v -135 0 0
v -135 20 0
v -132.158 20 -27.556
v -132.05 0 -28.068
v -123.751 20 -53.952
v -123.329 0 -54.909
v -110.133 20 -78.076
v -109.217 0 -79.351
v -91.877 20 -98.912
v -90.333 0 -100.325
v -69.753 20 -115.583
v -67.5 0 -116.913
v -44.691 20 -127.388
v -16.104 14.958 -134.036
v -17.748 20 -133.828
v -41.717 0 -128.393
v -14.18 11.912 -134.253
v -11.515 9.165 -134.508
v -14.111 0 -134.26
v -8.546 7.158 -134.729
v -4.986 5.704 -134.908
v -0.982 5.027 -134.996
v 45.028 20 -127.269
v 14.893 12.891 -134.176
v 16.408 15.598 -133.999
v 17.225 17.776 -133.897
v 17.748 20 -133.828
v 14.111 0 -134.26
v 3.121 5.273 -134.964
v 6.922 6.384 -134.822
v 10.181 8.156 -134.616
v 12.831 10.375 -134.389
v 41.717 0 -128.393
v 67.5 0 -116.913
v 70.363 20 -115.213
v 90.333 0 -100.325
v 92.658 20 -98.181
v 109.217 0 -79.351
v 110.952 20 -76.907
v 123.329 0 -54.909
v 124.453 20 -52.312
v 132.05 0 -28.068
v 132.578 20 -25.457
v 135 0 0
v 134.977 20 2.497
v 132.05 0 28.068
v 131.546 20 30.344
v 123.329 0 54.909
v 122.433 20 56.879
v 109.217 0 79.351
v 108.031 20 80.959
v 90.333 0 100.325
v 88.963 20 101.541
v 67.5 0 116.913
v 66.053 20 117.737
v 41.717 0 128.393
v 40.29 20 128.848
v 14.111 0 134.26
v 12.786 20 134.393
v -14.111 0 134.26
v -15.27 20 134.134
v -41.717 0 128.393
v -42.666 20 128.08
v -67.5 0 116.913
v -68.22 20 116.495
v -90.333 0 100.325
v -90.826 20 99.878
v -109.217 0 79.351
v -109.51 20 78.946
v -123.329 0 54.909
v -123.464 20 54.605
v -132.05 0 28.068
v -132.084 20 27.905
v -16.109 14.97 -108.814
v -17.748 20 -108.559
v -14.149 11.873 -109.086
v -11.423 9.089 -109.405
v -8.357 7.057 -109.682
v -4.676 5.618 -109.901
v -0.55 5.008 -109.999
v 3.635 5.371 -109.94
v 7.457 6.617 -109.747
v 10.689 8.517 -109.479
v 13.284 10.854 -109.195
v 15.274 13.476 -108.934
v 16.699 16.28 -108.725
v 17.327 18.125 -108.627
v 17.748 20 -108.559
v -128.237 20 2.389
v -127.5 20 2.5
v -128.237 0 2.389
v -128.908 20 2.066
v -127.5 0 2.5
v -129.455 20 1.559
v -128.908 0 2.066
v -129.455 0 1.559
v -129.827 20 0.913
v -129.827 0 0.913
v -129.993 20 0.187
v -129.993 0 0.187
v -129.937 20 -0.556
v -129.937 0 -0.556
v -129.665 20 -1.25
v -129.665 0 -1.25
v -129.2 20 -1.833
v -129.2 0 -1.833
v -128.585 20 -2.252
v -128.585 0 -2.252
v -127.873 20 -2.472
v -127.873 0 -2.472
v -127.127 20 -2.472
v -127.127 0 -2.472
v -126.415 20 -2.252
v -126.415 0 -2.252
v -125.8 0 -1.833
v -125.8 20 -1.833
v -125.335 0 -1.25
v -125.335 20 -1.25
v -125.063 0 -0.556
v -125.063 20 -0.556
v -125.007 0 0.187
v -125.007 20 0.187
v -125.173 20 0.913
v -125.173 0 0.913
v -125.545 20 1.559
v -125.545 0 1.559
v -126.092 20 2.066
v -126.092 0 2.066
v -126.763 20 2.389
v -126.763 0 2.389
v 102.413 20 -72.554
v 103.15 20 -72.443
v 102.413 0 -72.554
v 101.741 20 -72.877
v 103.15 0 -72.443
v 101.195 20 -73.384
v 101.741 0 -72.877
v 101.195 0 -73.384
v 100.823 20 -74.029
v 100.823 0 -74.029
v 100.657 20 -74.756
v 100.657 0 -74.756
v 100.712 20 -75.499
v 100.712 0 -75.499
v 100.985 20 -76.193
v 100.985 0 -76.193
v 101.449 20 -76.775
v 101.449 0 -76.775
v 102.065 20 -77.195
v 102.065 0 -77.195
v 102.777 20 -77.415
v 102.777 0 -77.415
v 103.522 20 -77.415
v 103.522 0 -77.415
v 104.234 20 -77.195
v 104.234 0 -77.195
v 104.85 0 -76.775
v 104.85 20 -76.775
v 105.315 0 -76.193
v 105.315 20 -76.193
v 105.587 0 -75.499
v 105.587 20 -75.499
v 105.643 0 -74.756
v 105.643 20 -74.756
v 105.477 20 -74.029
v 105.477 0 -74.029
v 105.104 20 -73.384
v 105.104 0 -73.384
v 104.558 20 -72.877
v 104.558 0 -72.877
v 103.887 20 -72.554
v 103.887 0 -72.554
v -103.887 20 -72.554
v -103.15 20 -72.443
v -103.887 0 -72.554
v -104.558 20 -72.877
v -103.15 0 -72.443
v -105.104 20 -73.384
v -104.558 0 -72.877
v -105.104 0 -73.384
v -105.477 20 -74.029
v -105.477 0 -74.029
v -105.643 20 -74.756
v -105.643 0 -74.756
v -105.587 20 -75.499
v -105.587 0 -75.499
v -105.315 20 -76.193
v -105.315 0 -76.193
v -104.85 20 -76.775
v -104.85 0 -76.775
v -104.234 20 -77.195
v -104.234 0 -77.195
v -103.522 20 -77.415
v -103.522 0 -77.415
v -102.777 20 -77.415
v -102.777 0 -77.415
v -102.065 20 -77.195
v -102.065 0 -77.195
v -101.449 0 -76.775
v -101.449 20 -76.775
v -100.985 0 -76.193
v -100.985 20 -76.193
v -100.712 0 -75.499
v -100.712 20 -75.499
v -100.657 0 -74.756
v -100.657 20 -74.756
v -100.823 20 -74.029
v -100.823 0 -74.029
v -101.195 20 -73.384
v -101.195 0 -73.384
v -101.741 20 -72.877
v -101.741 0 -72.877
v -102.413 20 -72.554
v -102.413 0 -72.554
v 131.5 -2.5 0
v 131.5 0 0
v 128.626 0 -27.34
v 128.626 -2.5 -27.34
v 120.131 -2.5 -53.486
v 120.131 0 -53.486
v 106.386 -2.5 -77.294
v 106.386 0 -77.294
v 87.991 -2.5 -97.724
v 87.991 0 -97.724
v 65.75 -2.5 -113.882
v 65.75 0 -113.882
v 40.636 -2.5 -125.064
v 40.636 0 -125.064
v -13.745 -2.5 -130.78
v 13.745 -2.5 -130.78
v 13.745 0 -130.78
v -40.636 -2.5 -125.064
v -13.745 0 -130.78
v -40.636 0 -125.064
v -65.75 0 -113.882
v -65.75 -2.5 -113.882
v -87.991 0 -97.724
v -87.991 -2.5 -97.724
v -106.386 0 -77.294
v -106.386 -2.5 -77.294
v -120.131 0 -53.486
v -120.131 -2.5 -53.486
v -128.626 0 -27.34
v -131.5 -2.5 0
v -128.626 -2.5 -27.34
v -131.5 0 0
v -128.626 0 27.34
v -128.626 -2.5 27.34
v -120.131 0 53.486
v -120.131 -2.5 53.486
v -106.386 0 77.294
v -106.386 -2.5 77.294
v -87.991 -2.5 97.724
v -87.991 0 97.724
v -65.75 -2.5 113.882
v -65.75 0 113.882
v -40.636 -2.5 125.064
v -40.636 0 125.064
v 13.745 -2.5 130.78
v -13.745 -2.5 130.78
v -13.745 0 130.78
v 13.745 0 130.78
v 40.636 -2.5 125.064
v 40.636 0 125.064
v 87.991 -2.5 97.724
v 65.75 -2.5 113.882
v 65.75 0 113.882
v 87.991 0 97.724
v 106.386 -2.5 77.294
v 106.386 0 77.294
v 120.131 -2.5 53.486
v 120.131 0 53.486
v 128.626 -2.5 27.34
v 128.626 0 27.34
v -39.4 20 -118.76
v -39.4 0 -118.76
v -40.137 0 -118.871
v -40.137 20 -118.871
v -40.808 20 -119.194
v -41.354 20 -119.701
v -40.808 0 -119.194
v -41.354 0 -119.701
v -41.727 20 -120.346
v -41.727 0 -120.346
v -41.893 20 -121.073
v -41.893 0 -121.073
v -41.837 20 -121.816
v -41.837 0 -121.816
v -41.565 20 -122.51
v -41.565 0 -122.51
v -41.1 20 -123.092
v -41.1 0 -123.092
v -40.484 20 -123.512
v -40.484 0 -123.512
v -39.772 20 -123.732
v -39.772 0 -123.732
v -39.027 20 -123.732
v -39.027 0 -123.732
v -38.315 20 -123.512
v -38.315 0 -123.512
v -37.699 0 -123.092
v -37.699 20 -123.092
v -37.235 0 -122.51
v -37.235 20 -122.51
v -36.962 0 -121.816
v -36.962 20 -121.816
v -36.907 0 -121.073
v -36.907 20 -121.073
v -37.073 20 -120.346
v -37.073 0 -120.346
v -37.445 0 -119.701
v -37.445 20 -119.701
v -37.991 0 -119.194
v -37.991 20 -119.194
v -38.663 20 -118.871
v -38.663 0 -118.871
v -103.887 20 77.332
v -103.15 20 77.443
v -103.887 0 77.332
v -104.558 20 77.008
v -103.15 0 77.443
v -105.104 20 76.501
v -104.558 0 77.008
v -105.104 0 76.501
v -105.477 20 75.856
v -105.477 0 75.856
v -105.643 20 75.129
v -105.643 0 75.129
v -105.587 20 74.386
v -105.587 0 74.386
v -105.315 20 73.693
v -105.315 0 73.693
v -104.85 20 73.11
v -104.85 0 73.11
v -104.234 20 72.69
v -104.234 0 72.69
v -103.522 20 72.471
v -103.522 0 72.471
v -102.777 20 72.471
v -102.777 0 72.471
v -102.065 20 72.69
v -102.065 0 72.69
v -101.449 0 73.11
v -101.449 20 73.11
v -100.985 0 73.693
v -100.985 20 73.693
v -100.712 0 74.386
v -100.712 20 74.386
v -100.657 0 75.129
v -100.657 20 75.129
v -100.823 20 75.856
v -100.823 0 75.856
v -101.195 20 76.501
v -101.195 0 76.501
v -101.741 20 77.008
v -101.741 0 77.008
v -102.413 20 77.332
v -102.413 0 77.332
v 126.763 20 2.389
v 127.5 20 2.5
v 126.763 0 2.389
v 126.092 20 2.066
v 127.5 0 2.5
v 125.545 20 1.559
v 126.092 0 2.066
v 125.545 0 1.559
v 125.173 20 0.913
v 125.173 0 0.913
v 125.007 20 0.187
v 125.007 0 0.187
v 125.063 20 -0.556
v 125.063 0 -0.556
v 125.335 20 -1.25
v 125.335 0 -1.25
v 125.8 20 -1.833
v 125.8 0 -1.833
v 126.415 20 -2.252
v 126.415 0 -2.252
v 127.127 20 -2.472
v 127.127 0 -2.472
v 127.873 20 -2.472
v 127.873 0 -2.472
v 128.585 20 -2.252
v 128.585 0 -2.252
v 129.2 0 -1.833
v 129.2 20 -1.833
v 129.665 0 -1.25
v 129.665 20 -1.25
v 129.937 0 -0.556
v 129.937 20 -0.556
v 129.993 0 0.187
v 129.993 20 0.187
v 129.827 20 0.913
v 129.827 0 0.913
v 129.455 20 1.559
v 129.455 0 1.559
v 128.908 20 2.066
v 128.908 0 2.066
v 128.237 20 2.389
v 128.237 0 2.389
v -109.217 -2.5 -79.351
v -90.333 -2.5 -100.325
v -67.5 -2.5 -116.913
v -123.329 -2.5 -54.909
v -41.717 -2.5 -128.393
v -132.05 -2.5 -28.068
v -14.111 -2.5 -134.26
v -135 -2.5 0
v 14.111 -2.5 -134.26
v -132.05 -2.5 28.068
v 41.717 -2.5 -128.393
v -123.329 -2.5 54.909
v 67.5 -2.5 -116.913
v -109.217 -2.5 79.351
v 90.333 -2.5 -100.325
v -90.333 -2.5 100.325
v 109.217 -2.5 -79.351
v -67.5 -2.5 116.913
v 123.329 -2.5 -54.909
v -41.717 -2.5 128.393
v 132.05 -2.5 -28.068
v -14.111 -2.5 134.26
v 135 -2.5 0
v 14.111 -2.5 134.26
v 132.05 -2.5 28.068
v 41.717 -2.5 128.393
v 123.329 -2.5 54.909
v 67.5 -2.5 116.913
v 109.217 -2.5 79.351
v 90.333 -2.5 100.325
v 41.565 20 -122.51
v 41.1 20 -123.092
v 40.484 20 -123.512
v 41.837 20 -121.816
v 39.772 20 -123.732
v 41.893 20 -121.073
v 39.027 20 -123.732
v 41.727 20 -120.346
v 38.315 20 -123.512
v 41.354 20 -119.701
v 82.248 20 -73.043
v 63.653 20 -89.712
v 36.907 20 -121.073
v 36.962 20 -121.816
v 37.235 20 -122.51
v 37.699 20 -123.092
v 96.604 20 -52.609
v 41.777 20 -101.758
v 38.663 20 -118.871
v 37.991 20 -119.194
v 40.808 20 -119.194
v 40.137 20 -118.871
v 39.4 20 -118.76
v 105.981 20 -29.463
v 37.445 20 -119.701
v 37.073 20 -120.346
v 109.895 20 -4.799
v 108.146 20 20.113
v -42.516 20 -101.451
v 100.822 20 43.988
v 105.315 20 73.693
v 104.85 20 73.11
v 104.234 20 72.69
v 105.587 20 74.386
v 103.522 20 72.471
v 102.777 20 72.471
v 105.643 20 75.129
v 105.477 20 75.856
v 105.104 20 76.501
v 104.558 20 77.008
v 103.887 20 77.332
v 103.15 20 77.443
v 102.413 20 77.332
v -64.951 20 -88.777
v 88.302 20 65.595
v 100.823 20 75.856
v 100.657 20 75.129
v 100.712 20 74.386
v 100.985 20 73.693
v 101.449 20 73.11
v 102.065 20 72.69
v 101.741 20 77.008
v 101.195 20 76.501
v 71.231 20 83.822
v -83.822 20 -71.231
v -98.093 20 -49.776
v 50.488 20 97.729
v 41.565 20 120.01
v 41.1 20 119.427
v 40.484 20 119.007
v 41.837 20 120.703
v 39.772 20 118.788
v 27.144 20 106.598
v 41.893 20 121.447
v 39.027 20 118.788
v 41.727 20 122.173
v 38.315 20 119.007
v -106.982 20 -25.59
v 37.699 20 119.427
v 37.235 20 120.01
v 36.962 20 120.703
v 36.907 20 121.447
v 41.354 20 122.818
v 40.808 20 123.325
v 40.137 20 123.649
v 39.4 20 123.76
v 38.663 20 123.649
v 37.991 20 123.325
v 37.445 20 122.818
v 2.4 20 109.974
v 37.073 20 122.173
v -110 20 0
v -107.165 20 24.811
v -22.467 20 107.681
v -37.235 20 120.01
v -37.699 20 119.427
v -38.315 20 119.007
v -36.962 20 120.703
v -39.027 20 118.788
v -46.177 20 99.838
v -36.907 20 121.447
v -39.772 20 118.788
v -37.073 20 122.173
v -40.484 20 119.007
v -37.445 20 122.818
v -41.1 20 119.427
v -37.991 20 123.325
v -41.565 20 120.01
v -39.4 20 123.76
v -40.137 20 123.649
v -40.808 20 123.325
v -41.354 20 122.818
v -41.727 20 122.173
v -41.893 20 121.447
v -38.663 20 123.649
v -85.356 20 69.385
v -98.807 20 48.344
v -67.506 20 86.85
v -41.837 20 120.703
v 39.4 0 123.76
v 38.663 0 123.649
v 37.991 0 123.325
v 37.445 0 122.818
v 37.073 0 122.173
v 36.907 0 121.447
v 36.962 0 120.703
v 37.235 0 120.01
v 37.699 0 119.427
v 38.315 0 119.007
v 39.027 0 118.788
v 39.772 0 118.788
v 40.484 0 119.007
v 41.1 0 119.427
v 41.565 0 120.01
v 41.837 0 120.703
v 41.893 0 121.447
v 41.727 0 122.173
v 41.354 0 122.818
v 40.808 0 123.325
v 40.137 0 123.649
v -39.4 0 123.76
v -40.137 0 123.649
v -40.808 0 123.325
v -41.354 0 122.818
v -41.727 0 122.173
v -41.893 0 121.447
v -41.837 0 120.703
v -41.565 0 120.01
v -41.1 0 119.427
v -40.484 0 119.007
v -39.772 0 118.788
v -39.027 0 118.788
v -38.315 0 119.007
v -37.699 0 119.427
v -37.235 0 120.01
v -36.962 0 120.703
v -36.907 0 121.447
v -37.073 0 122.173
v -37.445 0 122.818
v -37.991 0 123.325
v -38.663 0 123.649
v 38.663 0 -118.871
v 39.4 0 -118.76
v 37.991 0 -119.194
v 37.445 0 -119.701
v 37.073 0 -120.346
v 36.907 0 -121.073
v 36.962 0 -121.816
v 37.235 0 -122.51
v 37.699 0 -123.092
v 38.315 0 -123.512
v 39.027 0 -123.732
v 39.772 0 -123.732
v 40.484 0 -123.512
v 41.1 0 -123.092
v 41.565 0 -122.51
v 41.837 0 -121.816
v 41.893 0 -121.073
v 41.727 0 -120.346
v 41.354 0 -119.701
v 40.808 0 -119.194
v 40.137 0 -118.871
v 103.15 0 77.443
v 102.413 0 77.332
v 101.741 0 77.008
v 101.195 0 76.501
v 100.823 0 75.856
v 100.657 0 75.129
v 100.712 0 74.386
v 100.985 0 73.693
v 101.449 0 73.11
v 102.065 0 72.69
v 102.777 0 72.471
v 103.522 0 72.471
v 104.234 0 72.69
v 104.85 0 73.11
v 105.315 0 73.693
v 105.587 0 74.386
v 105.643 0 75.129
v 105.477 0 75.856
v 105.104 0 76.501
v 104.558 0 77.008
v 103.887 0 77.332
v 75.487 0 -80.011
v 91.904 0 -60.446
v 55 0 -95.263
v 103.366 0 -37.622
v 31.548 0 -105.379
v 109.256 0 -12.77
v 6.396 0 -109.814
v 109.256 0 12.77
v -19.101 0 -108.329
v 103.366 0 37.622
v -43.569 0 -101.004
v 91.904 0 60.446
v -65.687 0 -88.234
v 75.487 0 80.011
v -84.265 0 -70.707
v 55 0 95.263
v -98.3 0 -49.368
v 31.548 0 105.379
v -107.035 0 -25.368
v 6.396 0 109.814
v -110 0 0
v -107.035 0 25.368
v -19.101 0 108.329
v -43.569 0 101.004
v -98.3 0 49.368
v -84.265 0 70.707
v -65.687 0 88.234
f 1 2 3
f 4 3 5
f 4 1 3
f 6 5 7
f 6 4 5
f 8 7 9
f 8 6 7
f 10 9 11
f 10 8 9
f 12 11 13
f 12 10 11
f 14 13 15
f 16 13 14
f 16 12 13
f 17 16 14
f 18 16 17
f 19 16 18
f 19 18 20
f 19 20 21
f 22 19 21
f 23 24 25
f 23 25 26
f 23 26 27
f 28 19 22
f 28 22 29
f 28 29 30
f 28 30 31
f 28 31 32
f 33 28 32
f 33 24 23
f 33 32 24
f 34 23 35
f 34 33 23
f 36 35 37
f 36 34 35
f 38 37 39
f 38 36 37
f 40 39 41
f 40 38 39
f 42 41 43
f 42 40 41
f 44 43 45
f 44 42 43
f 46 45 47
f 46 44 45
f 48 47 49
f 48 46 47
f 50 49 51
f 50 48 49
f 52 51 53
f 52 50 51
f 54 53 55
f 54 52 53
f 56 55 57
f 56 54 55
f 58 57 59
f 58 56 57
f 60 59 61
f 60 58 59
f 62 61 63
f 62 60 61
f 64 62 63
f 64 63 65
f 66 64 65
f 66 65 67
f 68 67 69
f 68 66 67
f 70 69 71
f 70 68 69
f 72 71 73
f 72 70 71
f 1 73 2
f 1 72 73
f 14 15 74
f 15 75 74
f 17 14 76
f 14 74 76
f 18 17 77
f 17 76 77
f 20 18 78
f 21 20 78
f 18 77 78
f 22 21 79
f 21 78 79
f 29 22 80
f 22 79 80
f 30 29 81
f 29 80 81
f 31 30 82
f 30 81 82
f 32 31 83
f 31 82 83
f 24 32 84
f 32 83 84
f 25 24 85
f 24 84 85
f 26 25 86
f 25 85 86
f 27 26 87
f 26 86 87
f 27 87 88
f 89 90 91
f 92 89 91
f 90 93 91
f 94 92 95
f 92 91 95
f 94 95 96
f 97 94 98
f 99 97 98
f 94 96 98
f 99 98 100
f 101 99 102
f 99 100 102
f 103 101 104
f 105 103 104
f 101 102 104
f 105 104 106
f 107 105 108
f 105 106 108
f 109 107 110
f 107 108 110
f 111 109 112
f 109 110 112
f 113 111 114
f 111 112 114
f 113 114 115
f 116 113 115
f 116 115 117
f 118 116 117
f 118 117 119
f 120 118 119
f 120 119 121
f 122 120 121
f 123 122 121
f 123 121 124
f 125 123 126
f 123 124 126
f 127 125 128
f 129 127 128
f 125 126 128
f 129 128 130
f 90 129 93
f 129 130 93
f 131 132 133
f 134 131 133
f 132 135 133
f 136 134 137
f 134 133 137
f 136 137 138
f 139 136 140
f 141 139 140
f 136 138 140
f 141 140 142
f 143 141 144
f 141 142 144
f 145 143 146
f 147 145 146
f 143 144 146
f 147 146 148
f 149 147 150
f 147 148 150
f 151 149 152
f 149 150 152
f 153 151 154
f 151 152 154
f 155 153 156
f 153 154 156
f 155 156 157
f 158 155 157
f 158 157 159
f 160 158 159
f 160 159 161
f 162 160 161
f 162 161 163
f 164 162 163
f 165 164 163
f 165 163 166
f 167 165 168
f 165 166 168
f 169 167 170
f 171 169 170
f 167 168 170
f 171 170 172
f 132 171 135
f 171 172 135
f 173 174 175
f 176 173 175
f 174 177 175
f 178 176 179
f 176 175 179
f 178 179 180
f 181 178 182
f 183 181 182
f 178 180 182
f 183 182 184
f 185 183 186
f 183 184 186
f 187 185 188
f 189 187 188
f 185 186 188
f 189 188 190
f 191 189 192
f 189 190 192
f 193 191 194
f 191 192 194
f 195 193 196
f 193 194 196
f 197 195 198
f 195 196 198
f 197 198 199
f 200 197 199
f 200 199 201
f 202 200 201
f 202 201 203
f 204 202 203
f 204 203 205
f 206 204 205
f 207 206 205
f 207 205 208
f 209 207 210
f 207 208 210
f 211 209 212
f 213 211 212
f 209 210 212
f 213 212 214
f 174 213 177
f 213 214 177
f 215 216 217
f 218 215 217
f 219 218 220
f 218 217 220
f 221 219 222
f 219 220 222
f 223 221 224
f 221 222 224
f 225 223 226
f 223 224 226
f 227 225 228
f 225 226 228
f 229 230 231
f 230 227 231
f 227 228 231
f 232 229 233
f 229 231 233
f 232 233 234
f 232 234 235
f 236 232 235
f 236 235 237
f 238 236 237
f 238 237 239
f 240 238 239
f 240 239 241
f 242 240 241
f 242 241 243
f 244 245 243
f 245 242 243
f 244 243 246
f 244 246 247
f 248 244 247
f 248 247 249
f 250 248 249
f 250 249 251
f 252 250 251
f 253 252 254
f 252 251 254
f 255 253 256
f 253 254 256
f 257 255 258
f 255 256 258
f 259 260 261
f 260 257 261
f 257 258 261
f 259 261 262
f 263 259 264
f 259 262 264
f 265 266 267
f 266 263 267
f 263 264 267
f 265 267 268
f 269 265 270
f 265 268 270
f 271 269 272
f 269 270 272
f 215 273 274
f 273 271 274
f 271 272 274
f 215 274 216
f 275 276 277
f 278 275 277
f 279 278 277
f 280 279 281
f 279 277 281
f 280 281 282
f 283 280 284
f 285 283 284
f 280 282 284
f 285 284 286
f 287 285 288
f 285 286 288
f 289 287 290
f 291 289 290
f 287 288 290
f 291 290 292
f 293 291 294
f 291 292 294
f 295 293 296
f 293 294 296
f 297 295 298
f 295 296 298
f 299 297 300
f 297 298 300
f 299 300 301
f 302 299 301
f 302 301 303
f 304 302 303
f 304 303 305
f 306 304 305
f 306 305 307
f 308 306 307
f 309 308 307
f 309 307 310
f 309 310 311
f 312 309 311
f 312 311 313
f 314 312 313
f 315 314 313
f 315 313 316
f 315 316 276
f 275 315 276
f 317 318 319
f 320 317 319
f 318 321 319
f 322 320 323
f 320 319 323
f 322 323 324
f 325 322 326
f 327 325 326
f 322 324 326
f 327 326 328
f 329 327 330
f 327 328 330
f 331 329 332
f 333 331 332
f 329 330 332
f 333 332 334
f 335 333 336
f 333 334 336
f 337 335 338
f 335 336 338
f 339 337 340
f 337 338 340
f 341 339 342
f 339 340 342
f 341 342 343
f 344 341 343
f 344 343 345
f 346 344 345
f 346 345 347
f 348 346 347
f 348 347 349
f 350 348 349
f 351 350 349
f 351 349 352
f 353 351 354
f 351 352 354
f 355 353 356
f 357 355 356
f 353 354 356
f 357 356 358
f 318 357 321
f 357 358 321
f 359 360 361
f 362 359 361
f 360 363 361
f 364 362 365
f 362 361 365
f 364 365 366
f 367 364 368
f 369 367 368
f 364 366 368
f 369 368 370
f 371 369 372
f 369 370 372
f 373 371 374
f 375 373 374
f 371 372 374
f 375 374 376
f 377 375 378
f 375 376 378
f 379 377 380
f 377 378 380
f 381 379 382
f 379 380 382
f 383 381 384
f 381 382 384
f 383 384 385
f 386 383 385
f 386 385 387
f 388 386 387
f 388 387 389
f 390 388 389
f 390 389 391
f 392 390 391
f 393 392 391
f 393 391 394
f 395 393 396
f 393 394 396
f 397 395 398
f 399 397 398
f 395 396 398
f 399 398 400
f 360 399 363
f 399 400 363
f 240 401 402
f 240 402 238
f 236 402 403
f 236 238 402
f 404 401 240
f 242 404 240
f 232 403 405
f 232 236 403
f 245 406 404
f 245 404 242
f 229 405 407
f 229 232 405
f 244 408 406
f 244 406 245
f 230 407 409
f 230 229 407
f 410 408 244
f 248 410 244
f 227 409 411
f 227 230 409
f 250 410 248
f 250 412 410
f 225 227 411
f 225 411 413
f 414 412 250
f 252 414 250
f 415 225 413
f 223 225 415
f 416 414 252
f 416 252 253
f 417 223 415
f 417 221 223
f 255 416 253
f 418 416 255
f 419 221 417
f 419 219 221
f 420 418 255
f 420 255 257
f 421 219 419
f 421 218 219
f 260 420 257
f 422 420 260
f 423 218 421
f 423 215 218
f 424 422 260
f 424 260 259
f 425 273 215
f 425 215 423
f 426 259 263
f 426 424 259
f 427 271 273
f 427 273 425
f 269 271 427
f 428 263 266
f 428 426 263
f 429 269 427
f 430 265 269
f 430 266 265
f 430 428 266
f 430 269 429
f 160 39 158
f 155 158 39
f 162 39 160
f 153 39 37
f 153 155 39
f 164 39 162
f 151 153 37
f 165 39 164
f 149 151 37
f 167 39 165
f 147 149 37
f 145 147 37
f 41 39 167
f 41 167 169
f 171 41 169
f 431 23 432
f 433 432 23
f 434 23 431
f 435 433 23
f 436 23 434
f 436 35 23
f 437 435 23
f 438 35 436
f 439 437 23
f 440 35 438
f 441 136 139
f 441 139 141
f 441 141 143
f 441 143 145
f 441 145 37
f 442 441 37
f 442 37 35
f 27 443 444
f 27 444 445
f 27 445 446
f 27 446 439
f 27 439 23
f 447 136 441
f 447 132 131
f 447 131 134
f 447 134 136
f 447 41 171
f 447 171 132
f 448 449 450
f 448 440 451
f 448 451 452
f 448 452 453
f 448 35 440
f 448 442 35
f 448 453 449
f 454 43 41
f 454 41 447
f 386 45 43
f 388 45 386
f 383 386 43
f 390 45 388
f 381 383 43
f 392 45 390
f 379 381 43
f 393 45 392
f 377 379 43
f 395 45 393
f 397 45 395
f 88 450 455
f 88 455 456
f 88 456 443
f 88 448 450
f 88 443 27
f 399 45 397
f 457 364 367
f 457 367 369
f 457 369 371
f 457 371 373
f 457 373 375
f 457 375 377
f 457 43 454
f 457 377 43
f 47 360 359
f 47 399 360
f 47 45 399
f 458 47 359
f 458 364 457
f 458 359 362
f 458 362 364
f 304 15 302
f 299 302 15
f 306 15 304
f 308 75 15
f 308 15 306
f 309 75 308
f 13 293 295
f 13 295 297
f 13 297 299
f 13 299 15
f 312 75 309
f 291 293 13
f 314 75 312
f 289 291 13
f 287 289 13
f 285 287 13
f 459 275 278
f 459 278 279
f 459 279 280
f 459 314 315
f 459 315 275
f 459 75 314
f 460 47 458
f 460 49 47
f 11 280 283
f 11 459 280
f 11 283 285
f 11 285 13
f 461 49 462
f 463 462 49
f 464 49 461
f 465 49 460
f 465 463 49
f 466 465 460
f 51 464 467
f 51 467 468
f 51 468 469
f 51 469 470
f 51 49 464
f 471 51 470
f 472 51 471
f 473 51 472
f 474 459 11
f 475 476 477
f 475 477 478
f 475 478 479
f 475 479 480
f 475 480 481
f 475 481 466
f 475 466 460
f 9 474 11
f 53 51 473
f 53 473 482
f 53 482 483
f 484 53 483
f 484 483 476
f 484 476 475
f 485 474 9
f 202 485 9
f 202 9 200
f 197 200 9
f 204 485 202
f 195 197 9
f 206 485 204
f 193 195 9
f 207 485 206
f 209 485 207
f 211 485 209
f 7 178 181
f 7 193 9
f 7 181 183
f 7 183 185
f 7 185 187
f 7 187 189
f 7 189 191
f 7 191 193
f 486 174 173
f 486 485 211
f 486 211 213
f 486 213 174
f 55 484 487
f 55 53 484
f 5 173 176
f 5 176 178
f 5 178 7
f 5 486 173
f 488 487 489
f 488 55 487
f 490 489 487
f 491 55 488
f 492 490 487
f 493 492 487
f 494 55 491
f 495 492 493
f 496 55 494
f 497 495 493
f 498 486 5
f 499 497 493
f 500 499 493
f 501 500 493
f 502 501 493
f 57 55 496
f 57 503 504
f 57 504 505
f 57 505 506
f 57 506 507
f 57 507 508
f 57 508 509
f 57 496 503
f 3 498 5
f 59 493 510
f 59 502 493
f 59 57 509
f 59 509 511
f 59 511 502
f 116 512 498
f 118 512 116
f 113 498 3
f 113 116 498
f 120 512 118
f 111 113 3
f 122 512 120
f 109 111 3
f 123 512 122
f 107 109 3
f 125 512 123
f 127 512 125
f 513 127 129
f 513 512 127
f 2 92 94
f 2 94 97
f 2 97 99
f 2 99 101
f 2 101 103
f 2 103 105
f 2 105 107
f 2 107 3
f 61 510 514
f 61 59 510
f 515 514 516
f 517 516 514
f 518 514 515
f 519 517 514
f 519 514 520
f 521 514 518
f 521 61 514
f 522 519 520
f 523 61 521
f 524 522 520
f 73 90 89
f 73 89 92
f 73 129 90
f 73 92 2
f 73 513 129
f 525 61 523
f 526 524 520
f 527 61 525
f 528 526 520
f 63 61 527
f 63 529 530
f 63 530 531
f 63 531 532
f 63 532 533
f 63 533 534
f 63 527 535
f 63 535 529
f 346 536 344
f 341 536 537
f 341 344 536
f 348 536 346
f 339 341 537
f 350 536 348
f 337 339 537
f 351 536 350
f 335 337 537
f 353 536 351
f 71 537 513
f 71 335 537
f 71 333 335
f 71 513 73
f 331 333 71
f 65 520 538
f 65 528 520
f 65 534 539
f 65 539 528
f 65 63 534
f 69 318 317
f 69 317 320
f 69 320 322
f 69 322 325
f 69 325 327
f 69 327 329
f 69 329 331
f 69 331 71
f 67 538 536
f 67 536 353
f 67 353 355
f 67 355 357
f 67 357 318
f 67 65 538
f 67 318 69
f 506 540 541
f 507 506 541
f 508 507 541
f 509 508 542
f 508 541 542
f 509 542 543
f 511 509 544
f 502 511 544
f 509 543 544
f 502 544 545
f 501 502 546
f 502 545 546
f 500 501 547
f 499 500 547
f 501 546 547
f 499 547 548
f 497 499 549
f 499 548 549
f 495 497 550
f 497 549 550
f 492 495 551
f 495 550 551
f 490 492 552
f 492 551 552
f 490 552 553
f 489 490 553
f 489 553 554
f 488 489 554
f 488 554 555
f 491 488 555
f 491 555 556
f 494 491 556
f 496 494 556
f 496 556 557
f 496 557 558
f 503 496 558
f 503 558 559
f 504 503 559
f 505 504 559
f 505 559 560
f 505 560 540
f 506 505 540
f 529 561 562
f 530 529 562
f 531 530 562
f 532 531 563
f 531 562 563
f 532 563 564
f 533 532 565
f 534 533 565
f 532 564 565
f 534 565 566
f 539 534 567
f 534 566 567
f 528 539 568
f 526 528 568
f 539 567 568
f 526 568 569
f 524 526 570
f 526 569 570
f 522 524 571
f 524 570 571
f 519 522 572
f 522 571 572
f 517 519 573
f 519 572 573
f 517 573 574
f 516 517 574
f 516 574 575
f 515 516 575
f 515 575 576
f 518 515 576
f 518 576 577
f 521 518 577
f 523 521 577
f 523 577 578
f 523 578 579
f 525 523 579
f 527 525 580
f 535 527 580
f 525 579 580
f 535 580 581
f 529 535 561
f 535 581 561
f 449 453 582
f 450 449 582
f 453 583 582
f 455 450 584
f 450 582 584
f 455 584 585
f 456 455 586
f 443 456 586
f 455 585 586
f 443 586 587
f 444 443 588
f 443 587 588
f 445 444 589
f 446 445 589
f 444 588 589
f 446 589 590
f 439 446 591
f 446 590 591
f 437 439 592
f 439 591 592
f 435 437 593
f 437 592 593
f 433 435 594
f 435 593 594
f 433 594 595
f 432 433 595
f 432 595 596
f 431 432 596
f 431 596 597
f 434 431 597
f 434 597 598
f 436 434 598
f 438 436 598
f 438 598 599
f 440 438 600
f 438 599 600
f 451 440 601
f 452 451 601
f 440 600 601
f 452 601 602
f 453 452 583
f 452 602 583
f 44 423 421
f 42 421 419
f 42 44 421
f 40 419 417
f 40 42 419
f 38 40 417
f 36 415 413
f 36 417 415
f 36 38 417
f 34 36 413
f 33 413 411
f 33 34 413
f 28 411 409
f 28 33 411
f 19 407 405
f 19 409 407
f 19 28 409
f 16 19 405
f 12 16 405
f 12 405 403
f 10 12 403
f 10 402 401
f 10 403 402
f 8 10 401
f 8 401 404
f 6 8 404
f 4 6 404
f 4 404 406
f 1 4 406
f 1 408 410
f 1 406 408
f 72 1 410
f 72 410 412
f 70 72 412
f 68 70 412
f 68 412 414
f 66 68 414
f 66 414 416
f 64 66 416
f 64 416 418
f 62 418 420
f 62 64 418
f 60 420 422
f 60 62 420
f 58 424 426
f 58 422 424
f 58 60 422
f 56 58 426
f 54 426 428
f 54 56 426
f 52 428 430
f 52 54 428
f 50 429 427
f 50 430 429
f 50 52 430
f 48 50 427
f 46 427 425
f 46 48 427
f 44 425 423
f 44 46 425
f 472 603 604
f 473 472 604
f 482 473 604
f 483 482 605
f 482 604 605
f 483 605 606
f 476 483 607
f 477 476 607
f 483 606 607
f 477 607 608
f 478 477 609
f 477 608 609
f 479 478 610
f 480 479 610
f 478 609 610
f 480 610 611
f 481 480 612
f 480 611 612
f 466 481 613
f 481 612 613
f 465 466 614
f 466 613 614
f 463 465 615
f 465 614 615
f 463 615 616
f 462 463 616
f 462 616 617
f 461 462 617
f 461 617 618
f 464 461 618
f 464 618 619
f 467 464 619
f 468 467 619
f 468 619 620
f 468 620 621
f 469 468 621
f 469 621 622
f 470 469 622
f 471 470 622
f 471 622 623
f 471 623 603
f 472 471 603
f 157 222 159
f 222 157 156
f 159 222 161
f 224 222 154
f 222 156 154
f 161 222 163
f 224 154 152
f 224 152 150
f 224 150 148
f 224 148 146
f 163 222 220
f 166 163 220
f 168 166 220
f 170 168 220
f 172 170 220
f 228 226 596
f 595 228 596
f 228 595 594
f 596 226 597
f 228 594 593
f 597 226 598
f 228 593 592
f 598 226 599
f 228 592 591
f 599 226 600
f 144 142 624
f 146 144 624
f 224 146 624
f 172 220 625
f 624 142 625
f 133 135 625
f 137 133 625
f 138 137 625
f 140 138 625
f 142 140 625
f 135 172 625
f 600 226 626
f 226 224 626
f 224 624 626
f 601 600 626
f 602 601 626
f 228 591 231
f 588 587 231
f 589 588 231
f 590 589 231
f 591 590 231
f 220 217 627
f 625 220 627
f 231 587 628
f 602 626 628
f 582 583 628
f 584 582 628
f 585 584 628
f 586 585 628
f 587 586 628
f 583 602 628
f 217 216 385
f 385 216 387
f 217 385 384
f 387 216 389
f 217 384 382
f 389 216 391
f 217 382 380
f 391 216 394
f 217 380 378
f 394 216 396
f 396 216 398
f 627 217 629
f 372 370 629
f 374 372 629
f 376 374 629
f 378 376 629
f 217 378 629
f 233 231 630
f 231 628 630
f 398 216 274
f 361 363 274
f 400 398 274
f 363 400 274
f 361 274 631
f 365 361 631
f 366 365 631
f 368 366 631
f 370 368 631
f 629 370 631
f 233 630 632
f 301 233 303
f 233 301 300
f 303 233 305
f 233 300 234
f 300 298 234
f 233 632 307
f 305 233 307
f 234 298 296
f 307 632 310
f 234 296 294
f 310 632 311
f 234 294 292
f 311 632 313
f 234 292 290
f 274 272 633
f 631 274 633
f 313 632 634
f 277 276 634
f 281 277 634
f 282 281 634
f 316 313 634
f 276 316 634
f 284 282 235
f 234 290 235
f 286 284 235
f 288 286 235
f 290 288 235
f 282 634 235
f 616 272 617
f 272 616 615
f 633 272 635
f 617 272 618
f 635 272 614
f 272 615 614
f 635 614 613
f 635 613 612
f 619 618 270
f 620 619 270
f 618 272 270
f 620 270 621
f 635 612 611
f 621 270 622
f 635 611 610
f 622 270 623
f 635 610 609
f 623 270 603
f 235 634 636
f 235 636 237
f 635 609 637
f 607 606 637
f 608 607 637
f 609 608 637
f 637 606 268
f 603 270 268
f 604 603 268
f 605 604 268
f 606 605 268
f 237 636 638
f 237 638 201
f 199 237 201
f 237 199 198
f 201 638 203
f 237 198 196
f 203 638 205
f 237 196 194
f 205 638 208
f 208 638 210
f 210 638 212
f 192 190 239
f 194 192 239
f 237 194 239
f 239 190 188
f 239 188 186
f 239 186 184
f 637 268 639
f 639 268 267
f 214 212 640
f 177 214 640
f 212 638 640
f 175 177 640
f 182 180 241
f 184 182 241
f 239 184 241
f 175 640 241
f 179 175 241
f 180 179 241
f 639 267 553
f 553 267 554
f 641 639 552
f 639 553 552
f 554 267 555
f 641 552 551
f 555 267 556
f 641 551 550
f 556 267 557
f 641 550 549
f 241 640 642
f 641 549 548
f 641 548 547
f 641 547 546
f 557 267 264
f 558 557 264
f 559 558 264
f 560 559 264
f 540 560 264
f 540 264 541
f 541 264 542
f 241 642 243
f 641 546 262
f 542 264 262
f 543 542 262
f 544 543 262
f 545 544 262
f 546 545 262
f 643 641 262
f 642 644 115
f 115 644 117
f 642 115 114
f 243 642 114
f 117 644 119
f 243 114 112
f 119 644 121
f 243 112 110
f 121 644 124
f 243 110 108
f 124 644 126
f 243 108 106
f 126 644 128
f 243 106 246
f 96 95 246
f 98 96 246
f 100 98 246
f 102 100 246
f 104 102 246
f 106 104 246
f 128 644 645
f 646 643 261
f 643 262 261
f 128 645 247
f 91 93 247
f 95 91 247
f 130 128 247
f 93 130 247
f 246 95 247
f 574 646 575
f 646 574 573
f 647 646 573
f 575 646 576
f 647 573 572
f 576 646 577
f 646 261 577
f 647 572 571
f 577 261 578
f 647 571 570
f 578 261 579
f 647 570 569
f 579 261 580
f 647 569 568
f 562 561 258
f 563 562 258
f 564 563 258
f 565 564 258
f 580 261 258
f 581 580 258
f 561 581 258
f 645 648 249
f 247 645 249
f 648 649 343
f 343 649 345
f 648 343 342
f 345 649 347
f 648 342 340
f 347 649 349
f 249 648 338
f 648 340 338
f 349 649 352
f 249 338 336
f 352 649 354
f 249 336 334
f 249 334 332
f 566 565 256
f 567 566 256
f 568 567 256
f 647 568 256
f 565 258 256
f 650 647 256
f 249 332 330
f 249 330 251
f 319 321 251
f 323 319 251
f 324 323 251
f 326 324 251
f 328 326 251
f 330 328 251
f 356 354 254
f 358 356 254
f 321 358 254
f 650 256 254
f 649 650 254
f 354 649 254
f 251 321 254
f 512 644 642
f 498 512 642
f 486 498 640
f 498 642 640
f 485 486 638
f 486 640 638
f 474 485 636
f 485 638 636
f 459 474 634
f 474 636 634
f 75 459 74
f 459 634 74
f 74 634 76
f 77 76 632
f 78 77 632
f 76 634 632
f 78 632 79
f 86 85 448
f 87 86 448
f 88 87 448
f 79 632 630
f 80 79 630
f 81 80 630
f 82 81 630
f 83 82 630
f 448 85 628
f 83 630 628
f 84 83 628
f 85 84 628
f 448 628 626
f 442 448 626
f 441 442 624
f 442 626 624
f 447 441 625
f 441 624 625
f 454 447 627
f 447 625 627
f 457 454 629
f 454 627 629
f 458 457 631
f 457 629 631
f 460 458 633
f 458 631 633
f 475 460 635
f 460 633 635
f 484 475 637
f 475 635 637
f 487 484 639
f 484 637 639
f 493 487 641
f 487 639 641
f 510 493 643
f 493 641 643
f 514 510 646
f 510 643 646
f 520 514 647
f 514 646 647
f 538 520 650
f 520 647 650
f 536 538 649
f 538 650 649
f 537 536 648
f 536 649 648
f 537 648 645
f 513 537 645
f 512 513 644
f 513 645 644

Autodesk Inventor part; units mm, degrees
ref_plane "YZ Plane" through (0, 0, 0) normal (1, 0, 0) x (0, 1, 0)
ref_plane "XZ Plane" through (0, 0, 0) normal (0, 1, 0) x (-1, 0, 0)
ref_plane "XY Plane" through (0, 0, 0) normal (0, 0, 1) x (1, 0, 0)
sketch "Sketch1" plane through (0, 0, 0) normal (0, 1, 0) x (-1, 0, 0)
  circle A0 centre (0, 0) radius 135
  circle A1 centre (0, 0) radius 110
  dimension "d0" = 270
  dimension "d1" = 220
extrude "Extrusion1" add sketch "Sketch1" along normal blind 20
sketch "Sketch2" plane through (0, 0, 0) normal (0, 0, 1) x (1, 0, 0)
  circle A0 centre (0, 23) radius 18
  line L0 (135, 0) -> (-135, 0) projected
  point P0 (0, 0)
  dimension "d4" = 36
  dimension "d5" = 23
extrude "Extrusion2" cut sketch "Sketch2" against normal through all
sketch "Sketch3" plane through (0, 20, 0) normal (0, 1, 0) x (1, 0, 0)
  circle A0 centre (0, 0) radius 127.5
  circle A1 centre (-127.5, 0) radius 2
  circle A2 centre (-103.1497, -74.9426) radius 2
  circle A3 centre (-39.3997, -121.2597) radius 2
  circle A4 centre (39.3997, -121.2597) radius 2
  circle A5 centre (103.1497, -74.9426) radius 2
  circle A6 centre (127.5, 0) radius 2
  circle A7 centre (103.1497, 74.9426) radius 2
  circle A8 centre (39.3997, 121.2597) radius 2
  circle A9 centre (-39.3997, 121.2597) radius 2
  circle A10 centre (-103.1497, 74.9426) radius 2
  dimension "d8" = 255
  dimension "d9" = 4
  dimension "d12" = 360
hole "Hole1" at (103.1497, 20, 74.9426) at (127.5, 20, 0) at (103.1497, 20, -74.9426) at (39.3997, 20, -121.2597) at (-39.3997, 20, -121.2597) at (-103.1497, 20, -74.9426) at (-127.5, 20, 0) at (-103.1497, 20, 74.9426) at (-39.3997, 20, 121.2597) at (39.3997, 20, 121.2597) direction (0, -1, 0) diameter 5 end through all
sketch "Sketch4" plane through (0, 0, 0) normal (0, -1, 0) x (1, 0, 0)
  circle A0 centre (0, 0) radius 131.5
  circle A1 centre (0, 0) radius 135
  dimension "d21" = 263
extrude "Extrusion3" add sketch "Sketch4" along normal blind 2.5
properties part number "Cylinder Bottom"
